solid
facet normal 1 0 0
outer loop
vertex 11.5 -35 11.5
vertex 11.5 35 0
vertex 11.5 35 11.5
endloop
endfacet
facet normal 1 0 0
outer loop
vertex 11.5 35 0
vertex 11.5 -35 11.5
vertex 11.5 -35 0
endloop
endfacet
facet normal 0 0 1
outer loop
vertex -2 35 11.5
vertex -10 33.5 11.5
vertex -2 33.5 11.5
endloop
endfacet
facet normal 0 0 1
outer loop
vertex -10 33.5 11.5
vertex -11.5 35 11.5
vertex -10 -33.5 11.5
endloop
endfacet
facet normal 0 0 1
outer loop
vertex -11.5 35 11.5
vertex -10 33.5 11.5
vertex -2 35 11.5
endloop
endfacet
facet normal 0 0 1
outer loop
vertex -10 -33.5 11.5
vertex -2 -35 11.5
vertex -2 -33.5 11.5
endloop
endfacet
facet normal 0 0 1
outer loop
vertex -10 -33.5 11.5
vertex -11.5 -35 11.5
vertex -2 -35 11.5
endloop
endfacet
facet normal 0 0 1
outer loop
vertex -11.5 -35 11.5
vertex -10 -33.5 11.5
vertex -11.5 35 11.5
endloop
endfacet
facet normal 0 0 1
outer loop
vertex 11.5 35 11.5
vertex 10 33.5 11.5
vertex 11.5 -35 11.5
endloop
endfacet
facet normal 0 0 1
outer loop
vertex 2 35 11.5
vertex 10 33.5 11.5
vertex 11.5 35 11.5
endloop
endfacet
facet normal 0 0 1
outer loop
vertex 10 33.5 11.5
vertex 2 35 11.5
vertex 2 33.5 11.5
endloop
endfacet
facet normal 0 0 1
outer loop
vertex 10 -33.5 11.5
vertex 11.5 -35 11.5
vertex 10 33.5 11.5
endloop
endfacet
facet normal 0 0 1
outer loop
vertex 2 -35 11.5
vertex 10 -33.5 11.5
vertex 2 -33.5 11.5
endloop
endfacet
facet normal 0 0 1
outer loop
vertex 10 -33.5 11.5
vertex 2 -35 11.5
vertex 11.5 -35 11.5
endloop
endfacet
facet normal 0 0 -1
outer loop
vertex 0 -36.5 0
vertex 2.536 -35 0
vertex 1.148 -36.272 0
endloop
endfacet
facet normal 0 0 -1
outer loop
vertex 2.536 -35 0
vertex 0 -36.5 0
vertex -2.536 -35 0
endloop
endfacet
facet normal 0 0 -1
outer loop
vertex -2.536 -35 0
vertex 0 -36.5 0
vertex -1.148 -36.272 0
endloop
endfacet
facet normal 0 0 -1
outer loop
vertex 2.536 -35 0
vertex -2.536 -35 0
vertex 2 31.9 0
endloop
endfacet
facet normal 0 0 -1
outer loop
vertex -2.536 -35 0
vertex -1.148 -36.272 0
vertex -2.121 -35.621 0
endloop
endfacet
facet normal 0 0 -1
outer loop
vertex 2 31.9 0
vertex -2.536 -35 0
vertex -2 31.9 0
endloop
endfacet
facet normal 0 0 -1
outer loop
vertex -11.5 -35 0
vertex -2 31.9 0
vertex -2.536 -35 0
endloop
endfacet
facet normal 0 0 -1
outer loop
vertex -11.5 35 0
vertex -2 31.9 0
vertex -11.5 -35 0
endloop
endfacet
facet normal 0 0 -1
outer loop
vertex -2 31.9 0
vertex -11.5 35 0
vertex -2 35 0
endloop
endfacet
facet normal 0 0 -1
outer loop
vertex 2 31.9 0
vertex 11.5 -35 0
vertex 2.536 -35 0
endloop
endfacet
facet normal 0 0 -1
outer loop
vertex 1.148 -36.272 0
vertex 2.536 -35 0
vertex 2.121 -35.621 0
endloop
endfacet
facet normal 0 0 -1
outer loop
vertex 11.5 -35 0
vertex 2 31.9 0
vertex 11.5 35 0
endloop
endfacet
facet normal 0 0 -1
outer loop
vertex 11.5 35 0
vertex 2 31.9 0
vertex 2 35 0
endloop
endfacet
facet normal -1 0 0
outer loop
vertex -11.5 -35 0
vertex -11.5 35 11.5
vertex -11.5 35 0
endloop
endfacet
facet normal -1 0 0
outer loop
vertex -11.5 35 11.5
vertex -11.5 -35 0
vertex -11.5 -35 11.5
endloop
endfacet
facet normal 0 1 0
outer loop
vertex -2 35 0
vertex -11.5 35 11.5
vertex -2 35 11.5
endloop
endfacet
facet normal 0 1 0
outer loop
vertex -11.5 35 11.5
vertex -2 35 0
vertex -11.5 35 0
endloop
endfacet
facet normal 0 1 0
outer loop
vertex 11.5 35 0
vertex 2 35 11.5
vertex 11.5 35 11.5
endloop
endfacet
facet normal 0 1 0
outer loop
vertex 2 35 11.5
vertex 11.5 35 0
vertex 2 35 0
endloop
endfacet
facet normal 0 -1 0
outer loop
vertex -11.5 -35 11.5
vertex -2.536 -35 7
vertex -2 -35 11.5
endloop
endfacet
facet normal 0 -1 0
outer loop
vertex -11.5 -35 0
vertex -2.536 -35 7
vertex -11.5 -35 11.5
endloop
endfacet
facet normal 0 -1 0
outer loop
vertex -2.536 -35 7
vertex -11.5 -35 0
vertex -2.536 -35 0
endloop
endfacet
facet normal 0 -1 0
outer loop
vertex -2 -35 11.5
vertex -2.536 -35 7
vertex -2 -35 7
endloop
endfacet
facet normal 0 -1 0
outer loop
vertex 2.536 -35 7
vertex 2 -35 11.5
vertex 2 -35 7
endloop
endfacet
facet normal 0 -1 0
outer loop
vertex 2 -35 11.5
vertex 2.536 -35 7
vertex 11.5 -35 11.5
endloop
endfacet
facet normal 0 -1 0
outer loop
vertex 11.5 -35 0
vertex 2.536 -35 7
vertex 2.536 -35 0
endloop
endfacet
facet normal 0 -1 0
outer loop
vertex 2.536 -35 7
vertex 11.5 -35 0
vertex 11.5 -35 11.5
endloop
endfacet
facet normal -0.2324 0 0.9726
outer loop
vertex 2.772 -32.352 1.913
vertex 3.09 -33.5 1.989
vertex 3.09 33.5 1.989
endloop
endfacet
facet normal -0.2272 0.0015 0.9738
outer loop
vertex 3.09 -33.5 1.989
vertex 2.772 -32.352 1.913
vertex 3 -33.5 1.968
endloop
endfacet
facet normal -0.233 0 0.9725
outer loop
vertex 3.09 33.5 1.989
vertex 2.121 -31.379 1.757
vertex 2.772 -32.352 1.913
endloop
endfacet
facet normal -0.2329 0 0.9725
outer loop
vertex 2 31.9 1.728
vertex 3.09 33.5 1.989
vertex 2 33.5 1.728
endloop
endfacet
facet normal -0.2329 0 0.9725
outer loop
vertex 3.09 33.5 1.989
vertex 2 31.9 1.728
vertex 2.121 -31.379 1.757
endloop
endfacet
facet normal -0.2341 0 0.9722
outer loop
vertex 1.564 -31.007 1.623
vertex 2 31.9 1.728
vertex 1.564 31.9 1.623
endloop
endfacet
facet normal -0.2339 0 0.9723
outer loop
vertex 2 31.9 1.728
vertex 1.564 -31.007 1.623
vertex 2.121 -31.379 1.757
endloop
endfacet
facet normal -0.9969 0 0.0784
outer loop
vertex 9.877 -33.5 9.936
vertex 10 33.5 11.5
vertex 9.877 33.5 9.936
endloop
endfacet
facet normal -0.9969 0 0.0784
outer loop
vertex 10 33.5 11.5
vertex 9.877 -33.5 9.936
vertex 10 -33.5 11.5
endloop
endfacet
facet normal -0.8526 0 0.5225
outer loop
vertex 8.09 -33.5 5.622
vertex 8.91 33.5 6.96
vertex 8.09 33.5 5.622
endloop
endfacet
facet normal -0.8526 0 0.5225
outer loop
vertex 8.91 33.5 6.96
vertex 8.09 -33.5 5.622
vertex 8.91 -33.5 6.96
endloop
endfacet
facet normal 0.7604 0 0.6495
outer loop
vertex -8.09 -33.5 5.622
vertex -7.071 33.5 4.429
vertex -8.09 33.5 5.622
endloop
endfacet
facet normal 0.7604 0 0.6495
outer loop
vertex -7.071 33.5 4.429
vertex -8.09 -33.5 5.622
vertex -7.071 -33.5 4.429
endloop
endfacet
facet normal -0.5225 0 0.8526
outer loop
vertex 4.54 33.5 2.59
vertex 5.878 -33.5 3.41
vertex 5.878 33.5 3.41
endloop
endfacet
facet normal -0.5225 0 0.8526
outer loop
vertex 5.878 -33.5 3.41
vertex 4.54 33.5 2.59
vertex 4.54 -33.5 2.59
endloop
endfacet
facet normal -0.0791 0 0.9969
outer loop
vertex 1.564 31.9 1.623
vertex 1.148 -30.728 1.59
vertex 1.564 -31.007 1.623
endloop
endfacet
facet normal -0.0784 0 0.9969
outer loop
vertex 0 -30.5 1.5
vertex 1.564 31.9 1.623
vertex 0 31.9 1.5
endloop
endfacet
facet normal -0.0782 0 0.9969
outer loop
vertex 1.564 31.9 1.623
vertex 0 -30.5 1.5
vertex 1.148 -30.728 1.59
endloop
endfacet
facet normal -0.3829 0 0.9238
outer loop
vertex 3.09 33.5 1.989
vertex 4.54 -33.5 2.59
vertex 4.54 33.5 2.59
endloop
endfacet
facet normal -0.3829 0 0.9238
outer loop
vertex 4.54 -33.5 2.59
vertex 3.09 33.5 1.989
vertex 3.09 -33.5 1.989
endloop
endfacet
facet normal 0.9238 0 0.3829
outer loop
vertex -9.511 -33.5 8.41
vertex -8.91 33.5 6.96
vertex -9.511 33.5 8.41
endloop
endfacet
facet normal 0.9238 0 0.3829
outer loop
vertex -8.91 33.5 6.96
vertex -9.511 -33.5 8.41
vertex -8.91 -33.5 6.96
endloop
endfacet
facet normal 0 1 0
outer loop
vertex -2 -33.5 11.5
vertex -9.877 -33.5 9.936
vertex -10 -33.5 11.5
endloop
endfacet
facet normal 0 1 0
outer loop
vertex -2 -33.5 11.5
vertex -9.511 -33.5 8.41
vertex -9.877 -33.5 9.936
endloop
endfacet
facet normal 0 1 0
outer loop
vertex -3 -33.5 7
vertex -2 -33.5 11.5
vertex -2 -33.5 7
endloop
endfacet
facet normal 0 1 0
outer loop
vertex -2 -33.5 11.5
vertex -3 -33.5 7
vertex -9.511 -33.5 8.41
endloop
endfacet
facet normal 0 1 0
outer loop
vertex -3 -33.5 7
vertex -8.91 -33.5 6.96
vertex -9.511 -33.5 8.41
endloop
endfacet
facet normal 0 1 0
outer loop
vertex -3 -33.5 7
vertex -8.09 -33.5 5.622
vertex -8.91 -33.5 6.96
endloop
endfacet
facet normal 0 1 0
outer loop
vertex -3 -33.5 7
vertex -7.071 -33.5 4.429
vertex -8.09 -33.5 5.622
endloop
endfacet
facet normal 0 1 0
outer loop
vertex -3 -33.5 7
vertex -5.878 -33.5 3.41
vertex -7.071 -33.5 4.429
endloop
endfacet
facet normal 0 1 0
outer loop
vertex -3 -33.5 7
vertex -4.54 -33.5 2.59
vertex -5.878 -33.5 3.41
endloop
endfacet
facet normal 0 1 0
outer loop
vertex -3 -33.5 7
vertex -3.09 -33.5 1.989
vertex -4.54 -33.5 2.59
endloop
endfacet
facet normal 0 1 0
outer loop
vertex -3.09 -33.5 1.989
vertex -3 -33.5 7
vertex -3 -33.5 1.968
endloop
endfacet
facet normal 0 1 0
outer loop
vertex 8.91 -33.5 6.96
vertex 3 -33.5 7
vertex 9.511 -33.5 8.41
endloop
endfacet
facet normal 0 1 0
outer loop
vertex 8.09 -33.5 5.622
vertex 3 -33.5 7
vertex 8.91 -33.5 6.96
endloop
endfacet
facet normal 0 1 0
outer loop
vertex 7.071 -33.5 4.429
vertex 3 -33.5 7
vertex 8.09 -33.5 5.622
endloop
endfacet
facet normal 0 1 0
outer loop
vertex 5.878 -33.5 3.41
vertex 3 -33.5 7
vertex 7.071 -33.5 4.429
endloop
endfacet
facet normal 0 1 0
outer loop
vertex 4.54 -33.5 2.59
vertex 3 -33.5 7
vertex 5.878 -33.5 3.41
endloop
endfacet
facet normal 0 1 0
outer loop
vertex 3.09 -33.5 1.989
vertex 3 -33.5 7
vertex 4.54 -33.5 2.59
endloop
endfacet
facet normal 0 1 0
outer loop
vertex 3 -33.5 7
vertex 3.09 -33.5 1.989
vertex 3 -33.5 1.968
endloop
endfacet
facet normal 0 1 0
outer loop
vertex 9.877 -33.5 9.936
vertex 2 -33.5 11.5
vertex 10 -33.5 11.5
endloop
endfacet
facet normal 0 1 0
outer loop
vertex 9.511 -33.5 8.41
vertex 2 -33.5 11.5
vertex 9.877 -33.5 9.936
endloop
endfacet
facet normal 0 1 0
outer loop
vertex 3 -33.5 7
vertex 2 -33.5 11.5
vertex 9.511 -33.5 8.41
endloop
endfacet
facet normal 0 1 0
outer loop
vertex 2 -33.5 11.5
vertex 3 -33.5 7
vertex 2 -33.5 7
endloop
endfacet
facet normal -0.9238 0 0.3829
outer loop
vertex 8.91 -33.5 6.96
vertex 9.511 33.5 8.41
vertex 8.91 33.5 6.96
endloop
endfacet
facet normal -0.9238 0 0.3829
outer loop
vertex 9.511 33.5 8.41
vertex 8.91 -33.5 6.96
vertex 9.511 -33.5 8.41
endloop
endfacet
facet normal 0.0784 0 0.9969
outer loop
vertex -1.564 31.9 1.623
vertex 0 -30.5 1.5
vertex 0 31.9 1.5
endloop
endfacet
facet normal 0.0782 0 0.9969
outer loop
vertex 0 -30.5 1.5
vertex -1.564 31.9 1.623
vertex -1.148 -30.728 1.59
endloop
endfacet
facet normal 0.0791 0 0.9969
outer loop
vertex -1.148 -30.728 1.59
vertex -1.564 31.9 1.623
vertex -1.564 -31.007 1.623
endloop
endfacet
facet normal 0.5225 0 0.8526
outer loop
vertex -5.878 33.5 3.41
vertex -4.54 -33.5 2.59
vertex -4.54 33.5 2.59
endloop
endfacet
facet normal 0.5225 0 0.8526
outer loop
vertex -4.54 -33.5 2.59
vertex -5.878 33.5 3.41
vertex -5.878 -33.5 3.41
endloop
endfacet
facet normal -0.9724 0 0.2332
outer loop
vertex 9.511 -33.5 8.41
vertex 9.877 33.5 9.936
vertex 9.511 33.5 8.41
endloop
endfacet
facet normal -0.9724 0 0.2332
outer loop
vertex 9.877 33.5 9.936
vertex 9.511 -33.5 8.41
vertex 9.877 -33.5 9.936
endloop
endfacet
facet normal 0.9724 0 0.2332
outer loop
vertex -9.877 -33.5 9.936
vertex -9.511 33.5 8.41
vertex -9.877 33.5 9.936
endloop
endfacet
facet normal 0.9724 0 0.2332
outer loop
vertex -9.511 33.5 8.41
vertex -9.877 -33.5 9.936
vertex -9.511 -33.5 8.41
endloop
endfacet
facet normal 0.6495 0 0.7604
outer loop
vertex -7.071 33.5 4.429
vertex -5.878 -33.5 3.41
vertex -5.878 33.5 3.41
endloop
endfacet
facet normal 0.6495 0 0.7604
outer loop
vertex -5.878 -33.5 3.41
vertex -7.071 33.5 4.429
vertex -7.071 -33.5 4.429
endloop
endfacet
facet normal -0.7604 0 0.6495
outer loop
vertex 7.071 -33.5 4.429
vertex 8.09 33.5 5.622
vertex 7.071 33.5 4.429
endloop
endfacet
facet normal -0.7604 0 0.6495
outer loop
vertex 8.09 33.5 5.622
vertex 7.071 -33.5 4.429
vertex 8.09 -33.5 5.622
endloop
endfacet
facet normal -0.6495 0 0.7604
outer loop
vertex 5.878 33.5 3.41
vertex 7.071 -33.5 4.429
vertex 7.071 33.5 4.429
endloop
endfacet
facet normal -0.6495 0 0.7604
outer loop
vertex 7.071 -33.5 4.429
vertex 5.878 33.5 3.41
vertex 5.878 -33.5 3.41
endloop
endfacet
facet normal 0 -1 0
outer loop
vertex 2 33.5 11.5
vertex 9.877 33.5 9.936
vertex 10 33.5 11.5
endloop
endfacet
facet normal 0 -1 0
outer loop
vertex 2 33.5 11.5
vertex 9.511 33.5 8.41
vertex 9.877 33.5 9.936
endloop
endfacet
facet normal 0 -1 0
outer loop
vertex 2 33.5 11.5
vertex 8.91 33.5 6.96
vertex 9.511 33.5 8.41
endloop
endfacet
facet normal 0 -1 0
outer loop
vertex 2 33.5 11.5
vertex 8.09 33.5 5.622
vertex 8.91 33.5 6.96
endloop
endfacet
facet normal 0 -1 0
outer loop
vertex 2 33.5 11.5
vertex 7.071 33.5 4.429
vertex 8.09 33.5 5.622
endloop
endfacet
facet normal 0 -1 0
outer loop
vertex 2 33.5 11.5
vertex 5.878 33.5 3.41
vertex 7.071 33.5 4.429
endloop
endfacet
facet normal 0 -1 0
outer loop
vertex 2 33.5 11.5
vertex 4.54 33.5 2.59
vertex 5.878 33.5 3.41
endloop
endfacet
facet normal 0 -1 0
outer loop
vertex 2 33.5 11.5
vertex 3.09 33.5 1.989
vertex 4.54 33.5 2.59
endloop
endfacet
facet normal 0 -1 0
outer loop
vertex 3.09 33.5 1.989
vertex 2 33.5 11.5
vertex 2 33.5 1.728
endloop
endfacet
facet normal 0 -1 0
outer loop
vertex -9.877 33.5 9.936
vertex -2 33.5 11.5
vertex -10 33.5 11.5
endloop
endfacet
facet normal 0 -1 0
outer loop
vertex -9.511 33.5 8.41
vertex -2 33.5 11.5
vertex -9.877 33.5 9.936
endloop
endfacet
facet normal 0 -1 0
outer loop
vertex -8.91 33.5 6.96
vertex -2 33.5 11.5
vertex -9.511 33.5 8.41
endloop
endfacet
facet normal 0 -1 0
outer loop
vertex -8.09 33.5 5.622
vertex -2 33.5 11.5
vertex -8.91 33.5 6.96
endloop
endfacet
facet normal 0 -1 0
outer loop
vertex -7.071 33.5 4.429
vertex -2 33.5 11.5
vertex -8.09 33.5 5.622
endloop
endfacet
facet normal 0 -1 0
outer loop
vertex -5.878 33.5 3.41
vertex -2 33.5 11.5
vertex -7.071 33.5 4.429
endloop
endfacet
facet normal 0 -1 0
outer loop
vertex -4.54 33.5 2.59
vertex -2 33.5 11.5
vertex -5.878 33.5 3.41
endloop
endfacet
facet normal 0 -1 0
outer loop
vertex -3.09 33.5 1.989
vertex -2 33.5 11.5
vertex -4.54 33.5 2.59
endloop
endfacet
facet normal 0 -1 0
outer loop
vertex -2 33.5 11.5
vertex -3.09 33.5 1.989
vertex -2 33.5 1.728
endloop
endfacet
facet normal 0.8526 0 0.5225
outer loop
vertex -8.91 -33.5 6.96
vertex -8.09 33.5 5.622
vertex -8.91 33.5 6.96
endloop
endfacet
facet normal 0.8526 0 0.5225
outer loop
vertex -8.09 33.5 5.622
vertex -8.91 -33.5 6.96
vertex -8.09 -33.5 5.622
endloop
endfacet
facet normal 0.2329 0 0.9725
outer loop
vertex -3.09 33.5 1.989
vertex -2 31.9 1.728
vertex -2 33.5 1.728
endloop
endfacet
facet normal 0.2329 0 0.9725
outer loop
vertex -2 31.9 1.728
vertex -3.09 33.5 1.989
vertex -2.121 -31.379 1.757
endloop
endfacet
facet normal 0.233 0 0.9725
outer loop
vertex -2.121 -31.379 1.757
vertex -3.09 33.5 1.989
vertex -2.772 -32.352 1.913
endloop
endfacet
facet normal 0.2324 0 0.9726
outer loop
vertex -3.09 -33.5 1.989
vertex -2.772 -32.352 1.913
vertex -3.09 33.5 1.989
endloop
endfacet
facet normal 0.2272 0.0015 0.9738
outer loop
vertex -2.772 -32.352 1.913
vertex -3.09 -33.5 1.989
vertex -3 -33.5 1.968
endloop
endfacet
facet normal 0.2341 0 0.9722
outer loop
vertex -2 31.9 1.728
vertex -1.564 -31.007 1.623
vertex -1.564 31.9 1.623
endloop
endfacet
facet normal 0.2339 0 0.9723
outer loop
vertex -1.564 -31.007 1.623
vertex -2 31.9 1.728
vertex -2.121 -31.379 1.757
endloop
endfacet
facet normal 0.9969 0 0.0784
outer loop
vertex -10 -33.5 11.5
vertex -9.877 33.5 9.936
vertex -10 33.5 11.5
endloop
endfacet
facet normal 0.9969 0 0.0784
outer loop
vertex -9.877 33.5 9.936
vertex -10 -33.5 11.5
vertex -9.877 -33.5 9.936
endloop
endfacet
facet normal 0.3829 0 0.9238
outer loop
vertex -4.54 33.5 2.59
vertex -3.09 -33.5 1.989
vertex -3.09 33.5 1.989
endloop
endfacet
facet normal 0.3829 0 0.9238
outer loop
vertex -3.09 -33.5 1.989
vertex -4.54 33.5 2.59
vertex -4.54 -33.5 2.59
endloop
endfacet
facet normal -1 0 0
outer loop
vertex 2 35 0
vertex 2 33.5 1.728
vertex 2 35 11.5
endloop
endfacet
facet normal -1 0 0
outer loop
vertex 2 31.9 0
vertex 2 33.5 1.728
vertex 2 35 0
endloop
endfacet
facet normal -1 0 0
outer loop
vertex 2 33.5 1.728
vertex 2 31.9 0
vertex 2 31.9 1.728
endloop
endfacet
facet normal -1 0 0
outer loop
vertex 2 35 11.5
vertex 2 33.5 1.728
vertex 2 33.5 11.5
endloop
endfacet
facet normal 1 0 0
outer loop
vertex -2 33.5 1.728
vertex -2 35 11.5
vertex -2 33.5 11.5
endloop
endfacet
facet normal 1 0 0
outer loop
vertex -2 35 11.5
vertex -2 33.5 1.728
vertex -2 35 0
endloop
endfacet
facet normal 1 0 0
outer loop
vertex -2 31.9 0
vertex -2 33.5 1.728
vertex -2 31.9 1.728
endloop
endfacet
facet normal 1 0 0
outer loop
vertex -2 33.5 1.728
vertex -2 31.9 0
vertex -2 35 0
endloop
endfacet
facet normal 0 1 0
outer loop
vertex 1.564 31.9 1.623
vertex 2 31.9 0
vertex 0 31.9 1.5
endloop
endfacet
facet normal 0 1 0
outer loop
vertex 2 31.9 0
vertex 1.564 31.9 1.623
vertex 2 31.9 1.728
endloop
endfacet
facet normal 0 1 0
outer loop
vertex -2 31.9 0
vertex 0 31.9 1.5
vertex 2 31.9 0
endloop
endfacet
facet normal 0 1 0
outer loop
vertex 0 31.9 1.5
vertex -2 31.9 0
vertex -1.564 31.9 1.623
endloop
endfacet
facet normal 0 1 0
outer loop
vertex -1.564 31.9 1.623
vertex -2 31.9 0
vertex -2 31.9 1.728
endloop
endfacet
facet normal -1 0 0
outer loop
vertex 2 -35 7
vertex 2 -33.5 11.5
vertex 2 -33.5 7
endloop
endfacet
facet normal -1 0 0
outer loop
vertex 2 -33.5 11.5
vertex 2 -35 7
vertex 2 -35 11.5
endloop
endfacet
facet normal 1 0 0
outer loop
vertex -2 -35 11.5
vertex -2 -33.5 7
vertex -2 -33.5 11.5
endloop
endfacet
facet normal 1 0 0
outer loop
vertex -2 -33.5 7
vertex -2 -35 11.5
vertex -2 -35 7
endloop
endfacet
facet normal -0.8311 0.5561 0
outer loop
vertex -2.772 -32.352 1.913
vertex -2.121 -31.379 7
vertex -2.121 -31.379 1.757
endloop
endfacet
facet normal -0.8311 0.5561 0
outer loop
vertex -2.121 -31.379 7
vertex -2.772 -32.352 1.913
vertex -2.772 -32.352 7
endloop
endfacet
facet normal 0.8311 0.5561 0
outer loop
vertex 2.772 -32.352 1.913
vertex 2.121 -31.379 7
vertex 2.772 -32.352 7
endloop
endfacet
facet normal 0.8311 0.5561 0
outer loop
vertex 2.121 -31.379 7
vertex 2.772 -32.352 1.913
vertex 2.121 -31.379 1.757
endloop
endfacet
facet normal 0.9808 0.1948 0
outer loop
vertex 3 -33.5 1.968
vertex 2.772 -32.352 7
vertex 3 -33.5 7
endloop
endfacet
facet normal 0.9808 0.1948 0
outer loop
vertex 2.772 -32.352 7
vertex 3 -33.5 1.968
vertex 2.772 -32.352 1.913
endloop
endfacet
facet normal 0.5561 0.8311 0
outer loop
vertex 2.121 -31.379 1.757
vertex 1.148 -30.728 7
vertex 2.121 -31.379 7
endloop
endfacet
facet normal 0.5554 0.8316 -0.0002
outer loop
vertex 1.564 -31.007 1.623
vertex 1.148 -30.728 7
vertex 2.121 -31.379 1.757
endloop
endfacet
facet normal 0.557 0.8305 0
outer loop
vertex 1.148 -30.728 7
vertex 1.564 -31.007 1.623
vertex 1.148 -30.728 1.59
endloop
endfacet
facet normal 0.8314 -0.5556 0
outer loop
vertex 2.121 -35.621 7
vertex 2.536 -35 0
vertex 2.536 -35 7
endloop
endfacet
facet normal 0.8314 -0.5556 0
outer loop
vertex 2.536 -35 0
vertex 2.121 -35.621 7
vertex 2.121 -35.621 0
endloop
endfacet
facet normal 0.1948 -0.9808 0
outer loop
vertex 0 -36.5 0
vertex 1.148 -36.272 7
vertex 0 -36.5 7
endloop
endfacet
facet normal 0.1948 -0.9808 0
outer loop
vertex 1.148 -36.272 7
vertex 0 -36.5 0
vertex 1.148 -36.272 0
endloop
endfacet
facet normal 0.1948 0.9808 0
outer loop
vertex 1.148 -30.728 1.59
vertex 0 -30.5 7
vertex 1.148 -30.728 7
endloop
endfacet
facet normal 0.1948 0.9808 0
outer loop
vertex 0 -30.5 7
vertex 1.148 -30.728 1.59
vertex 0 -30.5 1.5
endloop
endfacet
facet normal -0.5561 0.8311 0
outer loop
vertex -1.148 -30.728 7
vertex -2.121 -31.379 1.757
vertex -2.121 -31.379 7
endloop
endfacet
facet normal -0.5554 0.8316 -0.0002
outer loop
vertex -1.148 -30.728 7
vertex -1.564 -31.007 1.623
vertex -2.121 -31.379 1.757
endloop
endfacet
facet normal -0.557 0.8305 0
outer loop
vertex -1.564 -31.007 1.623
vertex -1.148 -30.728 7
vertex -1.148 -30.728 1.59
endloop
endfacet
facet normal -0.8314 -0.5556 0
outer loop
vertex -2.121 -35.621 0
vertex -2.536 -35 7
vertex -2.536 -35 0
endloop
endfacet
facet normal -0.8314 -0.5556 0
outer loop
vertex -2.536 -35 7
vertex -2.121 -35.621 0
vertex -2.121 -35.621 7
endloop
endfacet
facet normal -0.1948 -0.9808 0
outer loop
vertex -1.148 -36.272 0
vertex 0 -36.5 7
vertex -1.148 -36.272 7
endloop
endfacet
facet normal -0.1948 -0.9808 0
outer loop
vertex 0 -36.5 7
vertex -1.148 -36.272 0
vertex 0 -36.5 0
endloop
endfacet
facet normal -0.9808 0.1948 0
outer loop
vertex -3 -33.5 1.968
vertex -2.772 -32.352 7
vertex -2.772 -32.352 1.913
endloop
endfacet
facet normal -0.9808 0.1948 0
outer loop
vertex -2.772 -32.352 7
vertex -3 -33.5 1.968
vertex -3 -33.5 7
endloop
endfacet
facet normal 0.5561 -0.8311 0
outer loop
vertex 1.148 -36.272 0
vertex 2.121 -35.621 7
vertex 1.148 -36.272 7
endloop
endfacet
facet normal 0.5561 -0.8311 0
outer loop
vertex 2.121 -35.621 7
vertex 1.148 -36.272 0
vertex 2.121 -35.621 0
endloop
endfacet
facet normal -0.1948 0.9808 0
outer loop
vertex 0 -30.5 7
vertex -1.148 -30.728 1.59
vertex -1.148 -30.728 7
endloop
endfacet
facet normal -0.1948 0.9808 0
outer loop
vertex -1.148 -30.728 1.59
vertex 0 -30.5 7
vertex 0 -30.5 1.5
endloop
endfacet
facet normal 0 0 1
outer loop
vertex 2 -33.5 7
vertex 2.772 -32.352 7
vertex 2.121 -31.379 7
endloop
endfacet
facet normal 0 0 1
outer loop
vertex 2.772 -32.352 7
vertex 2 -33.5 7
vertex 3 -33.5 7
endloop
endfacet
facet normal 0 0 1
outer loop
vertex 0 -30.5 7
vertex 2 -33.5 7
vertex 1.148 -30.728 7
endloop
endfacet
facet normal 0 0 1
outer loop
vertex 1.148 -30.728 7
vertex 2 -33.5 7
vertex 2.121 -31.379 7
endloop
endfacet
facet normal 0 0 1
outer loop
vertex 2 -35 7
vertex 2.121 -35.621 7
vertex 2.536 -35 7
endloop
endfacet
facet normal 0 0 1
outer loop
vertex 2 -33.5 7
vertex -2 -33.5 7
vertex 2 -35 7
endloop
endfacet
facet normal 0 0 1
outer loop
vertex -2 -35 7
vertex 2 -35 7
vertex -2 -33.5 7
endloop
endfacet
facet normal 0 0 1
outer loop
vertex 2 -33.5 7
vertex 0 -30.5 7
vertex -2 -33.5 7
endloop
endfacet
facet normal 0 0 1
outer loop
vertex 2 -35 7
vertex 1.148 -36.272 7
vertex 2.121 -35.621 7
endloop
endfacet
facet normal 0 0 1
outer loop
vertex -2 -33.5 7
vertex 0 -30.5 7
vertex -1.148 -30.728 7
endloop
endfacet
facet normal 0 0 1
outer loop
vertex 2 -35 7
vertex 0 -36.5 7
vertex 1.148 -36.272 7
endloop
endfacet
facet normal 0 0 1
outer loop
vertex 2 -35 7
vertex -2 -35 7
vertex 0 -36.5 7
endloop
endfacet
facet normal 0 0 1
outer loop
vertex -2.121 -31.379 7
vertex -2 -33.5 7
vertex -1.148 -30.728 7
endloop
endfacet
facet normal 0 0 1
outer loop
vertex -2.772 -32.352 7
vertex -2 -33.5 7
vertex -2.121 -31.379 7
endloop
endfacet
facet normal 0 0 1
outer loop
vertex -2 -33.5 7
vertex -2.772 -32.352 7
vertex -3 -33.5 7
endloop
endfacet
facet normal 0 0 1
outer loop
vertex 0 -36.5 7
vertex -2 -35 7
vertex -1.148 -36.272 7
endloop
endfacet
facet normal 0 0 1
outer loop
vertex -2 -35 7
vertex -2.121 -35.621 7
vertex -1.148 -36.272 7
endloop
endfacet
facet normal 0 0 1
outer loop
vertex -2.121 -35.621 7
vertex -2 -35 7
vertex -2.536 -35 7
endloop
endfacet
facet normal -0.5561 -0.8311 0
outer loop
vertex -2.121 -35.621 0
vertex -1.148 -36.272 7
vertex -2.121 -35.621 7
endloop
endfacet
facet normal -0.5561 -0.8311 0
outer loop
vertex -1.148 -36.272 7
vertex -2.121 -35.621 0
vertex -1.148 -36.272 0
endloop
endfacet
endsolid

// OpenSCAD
// ============================================================
// Orb V2 — 电池槽（18650 单节）
// ============================================================

// --- 参数 ---
bat_diameter  = 18;      // 18650 直径
bat_length    = 65;      // 18650 长度
slot_padding  = 1;       // 槽壁间隙
slot_wall     = 1.5;     // 槽壁厚度

slot_w = bat_diameter + slot_padding * 2 + slot_wall * 2;   // ~22mm
slot_l = bat_length + slot_padding * 2 + slot_wall * 2;     // ~71mm
slot_h = bat_diameter / 2 + slot_padding + slot_wall;        // ~12.5mm

module battery_slot() {
    difference() {
        // 外壳
        translate([-slot_w / 2, -slot_l / 2, 0])
            cube([slot_w, slot_l, slot_h]);

        // 电池腔（圆柱形底部）
        translate([0, 0, slot_h])
            rotate([90, 0, 0])
                translate([0, 0, -bat_length / 2 - slot_padding])
                    cylinder(h = bat_length + slot_padding * 2,
                             r = bat_diameter / 2 + slot_padding, $fn = 40);

        // 导线槽
        translate([0, slot_l / 2 - slot_wall, slot_h / 2])
            cube([4, slot_wall * 2 + 0.2, slot_h], center = true);
        translate([0, -(slot_l / 2 - slot_wall), slot_h / 2])
            cube([4, slot_wall * 2 + 0.2, slot_h], center = true);
    }

    // 弹簧触片凸台
    translate([0, -slot_l / 2 + slot_wall, 0])
        cylinder(h = slot_h - bat_diameter / 4, r = 3, $fn = 16);
}

battery_slot();
